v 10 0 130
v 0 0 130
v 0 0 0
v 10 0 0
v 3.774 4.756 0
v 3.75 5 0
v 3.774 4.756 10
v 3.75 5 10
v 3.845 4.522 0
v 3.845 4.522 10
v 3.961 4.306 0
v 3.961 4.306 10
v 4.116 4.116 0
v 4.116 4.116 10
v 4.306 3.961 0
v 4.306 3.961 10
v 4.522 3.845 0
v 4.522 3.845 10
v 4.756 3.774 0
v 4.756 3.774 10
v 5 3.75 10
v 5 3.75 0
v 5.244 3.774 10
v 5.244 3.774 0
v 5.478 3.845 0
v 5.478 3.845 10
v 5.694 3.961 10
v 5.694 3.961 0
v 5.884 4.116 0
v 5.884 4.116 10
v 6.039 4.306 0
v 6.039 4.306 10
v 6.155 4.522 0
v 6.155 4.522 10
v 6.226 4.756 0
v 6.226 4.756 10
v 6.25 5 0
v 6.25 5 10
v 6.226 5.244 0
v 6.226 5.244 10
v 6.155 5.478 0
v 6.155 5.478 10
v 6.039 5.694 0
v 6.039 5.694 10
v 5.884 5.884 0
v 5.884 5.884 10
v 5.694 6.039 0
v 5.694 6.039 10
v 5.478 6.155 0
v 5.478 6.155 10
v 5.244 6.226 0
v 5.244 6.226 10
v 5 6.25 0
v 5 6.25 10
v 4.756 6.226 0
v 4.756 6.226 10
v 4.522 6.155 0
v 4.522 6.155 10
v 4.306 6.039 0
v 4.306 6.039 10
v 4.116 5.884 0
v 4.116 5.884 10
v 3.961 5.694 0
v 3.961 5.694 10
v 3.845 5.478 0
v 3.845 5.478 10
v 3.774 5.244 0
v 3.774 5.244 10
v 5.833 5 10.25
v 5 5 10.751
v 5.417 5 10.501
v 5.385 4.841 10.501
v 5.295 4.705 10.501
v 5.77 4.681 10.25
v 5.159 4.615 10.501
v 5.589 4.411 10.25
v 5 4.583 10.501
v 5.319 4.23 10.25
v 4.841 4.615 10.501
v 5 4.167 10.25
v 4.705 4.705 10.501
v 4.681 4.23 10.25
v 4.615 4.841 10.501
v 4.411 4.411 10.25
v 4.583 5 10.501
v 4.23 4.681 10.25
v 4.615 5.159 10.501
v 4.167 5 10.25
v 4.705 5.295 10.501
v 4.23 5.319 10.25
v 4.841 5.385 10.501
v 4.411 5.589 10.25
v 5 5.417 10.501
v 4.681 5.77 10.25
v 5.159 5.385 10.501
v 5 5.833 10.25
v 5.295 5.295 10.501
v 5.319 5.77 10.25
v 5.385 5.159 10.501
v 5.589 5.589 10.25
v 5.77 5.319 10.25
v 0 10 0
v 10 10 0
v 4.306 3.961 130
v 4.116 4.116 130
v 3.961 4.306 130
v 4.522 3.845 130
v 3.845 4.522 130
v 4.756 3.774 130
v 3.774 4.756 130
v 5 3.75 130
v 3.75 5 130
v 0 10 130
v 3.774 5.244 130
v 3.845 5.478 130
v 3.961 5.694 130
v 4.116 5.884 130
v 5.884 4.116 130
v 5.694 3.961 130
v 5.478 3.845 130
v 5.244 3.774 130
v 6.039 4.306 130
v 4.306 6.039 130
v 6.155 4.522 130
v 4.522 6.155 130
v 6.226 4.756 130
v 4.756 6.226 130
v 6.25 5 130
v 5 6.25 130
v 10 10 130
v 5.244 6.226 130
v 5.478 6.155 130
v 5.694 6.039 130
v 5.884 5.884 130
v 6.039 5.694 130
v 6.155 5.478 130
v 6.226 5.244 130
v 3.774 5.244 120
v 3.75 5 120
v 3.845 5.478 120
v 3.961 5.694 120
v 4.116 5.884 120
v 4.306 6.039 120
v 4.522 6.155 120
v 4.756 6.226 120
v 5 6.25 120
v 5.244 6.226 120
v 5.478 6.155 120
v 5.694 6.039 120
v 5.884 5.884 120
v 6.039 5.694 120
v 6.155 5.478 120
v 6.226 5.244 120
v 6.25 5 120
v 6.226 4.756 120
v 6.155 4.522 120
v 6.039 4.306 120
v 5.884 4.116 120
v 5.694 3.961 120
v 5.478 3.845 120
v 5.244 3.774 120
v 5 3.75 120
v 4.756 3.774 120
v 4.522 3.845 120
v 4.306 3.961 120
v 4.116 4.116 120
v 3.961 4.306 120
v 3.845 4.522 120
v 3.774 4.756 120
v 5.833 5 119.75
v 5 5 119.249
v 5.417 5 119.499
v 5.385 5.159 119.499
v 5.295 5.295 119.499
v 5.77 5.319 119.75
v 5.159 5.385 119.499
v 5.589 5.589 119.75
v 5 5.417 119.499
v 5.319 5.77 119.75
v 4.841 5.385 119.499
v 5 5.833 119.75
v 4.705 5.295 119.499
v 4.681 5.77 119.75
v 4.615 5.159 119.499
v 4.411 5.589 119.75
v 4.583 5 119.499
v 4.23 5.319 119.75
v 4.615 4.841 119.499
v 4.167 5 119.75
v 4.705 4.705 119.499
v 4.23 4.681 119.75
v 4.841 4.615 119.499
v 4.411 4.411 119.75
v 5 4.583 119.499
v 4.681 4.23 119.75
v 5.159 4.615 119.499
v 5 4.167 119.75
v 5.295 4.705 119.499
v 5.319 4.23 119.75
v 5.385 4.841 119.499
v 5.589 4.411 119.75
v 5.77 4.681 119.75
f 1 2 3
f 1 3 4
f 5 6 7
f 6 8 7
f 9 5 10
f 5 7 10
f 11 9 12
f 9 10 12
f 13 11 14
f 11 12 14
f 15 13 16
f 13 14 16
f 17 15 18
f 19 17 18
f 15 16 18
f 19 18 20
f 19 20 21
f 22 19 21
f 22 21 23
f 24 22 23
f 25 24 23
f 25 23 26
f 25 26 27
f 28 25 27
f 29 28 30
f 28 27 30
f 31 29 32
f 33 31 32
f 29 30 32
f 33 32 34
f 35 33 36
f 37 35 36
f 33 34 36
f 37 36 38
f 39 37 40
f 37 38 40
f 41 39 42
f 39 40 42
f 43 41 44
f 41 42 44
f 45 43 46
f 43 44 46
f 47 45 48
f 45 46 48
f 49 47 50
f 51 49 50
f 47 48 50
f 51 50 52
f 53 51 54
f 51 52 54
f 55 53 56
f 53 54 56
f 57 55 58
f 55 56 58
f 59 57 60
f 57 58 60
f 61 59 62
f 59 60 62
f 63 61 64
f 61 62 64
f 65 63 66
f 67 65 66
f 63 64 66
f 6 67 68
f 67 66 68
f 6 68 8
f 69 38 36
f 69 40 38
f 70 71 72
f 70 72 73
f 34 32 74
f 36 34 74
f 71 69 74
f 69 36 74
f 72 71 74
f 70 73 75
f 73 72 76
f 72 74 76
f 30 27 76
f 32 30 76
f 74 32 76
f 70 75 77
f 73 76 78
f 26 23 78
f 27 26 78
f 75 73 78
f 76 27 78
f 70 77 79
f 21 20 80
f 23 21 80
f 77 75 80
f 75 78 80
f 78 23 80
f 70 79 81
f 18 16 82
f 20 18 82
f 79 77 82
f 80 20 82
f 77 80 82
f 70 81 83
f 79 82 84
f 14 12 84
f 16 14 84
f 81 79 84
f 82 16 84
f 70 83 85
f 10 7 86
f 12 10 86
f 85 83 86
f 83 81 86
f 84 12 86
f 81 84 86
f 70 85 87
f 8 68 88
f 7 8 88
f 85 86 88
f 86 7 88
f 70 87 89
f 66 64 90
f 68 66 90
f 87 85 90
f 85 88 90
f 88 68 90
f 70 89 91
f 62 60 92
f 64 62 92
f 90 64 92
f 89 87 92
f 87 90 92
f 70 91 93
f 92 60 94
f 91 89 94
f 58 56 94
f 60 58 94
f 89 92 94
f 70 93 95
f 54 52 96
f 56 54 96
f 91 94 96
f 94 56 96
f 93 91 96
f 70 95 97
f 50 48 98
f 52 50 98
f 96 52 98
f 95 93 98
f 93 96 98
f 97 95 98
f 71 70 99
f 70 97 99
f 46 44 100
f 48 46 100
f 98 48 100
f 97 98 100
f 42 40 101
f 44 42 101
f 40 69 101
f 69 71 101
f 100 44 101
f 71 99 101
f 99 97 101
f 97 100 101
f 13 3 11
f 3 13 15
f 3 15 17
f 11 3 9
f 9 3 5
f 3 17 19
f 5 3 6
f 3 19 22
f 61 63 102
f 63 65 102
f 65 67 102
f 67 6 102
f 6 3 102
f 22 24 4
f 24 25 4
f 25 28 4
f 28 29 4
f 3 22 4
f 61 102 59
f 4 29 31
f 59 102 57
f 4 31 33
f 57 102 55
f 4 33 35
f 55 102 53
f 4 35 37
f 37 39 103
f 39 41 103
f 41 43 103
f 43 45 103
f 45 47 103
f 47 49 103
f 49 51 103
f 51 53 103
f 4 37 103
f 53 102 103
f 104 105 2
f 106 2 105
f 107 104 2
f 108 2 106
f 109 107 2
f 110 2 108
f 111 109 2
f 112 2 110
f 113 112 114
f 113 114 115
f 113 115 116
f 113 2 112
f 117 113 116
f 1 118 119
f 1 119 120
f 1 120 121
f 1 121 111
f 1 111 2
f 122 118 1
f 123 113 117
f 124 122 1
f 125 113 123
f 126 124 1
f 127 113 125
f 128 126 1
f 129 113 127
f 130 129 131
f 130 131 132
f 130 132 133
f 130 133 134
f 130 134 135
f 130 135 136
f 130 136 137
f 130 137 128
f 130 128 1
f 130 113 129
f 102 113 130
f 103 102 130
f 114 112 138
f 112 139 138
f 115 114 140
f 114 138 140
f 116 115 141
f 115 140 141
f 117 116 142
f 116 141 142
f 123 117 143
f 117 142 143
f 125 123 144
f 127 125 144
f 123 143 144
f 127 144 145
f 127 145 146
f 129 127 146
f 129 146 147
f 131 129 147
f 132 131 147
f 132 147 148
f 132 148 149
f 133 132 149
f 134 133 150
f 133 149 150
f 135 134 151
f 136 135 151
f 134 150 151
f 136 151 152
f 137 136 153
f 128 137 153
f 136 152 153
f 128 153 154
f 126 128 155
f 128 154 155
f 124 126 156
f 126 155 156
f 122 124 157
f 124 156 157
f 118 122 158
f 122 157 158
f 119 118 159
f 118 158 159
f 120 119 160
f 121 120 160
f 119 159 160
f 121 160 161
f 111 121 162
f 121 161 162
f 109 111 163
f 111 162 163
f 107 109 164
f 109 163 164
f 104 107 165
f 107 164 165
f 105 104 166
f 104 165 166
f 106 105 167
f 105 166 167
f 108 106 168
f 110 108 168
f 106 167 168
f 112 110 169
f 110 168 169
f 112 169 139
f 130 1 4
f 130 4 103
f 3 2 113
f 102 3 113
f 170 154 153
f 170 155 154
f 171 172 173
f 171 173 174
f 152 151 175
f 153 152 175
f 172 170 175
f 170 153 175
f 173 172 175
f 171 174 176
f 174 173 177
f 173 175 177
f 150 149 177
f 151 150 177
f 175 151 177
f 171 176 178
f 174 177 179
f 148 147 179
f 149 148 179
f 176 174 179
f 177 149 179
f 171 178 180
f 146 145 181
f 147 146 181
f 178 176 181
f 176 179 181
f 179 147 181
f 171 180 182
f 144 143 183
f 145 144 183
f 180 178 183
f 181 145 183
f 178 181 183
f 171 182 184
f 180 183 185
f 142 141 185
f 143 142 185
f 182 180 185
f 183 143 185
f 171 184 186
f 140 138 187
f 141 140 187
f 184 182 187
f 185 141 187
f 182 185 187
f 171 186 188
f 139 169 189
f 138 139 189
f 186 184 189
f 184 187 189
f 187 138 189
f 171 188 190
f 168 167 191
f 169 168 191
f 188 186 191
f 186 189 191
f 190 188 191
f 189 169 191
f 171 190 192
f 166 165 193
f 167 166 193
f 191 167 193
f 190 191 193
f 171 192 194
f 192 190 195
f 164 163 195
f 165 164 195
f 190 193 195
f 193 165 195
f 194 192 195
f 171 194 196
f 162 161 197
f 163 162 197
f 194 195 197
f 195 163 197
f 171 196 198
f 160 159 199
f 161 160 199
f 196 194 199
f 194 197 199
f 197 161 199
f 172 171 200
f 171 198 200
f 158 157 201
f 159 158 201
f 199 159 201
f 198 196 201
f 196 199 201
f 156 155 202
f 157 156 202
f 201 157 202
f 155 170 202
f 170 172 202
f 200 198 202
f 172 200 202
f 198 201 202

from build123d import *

# Parameters (mm, degrees)
F0_W     = 10
F0_H     = 10
F1_DEPTH = 130
F3_D     = 2.5
F3_DEPTH = 10
F3_TIP   = 0.7510757738
F5_D     = 2.5
F5_DEPTH = 10
F5_TIP   = 0.7510757738


with BuildPart() as f1:
    # F0 (on Top) → F1 (new body)
    with BuildSketch(Plane.XY):
        with Locations((5, 5)):
            Rectangle(F0_W, F0_H)
    extrude(amount=F1_DEPTH)

    # F3
    with Locations(Plane(origin=(0, 0, 0), x_dir=(1, 0, 0), z_dir=(0, 0, -1))):
        with Locations((5, -5)):
            Hole(F3_D / 2, depth=F3_DEPTH)
            with Locations((0, 0, -(F3_DEPTH + F3_TIP / 2))):  # 118° drill point
                Cone(0, F3_D / 2, F3_TIP, mode=Mode.SUBTRACT)

    # F5
    with Locations(Plane.XY.offset(130)):
        with Locations((5, 5)):
            Hole(F5_D / 2, depth=F5_DEPTH)
            with Locations((0, 0, -(F5_DEPTH + F5_TIP / 2))):  # 118° drill point
                Cone(0, F5_D / 2, F5_TIP, mode=Mode.SUBTRACT)


solid = f1.part
